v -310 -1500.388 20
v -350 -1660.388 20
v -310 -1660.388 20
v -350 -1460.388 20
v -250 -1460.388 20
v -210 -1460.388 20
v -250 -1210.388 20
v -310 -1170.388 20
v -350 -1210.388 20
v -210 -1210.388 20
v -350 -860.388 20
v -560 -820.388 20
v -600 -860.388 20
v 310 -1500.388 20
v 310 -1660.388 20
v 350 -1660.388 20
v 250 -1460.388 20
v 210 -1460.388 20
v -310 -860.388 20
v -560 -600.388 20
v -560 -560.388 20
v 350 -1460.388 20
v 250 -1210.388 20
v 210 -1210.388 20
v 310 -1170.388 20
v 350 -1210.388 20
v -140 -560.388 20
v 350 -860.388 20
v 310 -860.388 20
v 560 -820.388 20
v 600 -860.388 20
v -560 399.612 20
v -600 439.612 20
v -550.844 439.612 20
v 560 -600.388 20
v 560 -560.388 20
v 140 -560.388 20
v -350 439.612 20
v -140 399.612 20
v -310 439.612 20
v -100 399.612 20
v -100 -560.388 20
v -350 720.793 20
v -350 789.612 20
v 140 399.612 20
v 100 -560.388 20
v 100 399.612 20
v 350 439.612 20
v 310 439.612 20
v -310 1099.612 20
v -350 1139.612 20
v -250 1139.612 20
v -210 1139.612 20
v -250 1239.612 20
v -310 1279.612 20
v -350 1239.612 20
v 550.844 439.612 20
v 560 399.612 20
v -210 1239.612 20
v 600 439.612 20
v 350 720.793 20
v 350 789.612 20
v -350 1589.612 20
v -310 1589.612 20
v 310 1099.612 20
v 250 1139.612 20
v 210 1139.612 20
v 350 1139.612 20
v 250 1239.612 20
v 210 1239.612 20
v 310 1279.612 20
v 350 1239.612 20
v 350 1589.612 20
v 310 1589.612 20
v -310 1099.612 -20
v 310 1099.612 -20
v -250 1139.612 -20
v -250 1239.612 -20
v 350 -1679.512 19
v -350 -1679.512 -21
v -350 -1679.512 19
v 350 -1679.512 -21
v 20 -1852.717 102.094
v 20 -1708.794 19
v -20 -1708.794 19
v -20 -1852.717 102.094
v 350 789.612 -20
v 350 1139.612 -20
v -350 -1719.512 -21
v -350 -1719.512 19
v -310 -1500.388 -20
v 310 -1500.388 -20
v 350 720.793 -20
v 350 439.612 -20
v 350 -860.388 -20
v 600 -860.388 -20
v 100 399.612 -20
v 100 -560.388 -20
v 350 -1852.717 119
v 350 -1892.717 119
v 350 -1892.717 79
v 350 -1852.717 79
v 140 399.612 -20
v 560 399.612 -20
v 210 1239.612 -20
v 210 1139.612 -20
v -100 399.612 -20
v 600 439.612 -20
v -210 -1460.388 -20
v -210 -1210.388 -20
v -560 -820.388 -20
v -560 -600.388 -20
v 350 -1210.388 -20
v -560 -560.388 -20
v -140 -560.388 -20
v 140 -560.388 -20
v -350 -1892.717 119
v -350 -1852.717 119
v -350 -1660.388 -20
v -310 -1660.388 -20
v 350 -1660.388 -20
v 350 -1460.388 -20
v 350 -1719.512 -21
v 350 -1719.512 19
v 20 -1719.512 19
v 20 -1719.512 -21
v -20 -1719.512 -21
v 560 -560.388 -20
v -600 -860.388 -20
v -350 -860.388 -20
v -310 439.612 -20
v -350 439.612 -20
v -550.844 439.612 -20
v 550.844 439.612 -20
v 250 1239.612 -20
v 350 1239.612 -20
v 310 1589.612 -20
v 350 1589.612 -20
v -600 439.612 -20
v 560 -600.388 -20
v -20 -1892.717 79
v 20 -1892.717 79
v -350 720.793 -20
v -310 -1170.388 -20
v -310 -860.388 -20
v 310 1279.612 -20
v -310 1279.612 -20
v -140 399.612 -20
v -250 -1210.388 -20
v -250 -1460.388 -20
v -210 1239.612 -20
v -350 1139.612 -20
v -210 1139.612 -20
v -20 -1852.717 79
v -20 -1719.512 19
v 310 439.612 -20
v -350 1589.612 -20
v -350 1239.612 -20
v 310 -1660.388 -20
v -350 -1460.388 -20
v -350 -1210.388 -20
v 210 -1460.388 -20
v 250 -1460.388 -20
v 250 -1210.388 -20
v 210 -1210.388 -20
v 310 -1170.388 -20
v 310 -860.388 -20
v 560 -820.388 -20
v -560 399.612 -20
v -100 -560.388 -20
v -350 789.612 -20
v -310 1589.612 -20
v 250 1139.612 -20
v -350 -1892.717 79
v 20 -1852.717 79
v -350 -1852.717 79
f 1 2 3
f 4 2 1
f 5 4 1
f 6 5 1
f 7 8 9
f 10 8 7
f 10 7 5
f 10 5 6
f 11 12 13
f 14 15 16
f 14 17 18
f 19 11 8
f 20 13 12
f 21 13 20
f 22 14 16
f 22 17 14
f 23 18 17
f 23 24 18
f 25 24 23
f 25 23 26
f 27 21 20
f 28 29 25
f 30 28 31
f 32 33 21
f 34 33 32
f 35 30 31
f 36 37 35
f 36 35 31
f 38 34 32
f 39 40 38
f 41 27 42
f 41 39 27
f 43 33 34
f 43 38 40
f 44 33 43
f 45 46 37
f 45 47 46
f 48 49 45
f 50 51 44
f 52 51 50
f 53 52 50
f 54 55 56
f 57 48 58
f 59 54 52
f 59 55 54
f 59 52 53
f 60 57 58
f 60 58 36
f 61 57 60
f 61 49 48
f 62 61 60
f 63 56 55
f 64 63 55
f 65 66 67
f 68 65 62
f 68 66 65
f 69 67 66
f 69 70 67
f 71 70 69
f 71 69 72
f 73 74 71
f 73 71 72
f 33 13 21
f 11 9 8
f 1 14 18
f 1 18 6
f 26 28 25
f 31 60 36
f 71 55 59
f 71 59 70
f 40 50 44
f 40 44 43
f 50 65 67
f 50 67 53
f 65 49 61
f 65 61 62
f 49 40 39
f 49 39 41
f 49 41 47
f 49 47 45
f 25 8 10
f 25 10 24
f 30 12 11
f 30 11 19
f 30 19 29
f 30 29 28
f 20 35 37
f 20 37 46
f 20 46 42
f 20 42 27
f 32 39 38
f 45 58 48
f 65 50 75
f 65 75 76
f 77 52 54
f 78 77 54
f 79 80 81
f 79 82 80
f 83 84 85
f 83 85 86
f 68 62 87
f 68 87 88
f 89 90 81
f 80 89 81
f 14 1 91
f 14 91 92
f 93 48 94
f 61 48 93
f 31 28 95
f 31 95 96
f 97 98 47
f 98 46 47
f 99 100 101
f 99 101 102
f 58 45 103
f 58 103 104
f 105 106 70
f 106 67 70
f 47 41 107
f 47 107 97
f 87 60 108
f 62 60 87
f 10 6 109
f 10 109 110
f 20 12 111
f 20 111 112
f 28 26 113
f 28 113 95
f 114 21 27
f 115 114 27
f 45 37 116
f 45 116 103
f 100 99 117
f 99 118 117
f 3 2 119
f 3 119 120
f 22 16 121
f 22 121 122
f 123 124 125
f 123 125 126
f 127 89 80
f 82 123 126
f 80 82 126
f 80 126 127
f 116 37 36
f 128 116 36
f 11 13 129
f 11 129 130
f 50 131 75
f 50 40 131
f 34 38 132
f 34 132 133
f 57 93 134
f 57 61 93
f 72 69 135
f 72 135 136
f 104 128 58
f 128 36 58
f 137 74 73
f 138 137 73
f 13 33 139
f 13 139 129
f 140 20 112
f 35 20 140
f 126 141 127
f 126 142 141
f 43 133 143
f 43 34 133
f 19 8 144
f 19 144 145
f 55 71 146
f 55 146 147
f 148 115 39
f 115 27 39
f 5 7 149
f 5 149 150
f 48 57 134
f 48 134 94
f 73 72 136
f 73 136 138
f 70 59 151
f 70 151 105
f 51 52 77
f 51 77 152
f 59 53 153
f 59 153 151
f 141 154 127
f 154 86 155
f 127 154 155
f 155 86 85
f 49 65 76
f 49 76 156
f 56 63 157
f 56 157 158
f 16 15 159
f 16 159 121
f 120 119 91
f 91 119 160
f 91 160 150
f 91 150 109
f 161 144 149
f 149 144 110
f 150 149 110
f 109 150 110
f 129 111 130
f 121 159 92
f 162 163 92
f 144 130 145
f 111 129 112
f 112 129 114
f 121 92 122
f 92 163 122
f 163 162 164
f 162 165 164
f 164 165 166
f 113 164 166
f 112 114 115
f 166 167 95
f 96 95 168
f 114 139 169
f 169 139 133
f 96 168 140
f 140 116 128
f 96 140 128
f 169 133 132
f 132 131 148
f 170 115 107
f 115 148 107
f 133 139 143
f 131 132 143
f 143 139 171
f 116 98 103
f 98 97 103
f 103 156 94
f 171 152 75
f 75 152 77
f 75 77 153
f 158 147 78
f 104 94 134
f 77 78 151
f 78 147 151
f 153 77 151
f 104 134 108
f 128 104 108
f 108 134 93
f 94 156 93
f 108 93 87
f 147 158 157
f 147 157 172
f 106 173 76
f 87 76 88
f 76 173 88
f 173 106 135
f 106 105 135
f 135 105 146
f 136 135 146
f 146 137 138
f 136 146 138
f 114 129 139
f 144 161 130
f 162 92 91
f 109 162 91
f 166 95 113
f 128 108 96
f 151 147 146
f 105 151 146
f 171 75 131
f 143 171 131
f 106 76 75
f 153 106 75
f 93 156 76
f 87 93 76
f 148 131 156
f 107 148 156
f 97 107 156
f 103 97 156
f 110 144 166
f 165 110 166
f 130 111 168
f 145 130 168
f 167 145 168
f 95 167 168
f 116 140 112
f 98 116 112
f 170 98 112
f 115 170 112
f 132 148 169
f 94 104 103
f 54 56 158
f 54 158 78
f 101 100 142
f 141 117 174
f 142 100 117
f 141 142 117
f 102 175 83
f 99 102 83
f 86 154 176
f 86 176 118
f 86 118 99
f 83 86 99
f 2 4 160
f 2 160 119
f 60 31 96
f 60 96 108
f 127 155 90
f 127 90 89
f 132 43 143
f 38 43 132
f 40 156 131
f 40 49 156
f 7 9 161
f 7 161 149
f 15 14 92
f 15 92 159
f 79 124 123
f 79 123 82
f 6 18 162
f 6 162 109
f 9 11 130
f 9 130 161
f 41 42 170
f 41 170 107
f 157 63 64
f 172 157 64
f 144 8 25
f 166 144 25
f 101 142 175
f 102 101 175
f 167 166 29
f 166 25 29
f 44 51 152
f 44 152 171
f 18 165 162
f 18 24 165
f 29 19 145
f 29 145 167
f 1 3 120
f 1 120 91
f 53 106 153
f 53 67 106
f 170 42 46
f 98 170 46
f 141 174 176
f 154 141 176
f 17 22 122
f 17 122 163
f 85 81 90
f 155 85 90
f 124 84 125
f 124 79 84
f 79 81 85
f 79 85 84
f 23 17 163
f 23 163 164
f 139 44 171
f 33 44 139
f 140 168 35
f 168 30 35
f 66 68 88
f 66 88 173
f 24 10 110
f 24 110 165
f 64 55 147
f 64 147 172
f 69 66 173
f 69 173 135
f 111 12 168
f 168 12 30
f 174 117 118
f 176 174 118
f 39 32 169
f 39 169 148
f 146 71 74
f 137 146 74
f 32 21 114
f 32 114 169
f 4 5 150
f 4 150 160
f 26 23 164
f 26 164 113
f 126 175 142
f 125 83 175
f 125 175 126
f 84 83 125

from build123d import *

# Parameters (mm, degrees)
F0_W     = 420
F0_H     = 960
F0_W_2   = 620
F0_H_2   = 310
F0_W_3   = 1120
F0_H_3   = 220
F0_W_4   = 200
F0_W_5   = 40
F0_H_4   = 100
F0_H_5   = 40
F1_DEPTH = 20
F3_DEPTH = 20
F4_DEPTH = 350


with BuildPart() as f1:
    # F0 (on Top) → F1 (new body, symmetric)
    with BuildSketch(Plane.XY):
        Polygon((0, 439.611647), (-100, 439.611647), (-310, 439.611647), (-310, 789.611647), (-350, 789.611647), (-600, 439.611647), (-600, -560.388353), (-600, -860.388353), (-350, -860.388353), (-350, -1210.388353), (-310, -1210.388353), (-250, -1210.388353), (-250, -1460.388353), (-310, -1460.388353), (-350, -1460.388353), (-350, -1660.388353), (-310, -1660.388353), (-310, -1500.388353), (310, -1500.388353), (310, -1660.388353), (350, -1660.388353), (350, -1460.388353), (310, -1460.388353), (250, -1460.388353), (250, -1210.388353), (310, -1210.388353), (350, -1210.388353), (350, -860.388353), (600, -860.388353), (600, -560.388353), (600, 439.611647), (350, 789.611647), (310, 789.611647), (310, 439.611647), (100, 439.611647), align=None)
        with Locations((-350, -80.388353)):
            Rectangle(F0_W, F0_H, mode=Mode.SUBTRACT)
        Polygon((210, -1460.388353), (0, -1460.388353), (-210, -1460.388353), (-210, -1210.388353), (0, -1210.388353), (210, -1210.388353), align=None, mode=Mode.SUBTRACT)
        with Locations((0, -1015.388353)):
            Rectangle(F0_W_2, F0_H_2, mode=Mode.SUBTRACT)
        with Locations((0, -710.388353)):
            Rectangle(F0_W_3, F0_H_3, mode=Mode.SUBTRACT)
        with Locations((0, -80.388353)):
            Rectangle(F0_W_4, F0_H, mode=Mode.SUBTRACT)
        with Locations((350, -80.388353)):
            Rectangle(F0_W, F0_H, mode=Mode.SUBTRACT)
        Polygon((-350, 720.793045), (-350, 439.611647), (-550.843856, 439.611647), align=None, mode=Mode.SUBTRACT)
        Polygon((550.843856, 439.611647), (350, 439.611647), (350, 720.793045), align=None, mode=Mode.SUBTRACT)
        Polygon((-350, 789.611647), (-310, 789.611647), (-310, 1099.611647), (0, 1099.611647), (310, 1099.611647), (310, 789.611647), (350, 789.611647), (350, 1139.611647), (250, 1139.611647), (210, 1139.611647), (0, 1139.611647), (-210, 1139.611647), (-250, 1139.611647), (-350, 1139.611647), align=None)
        with Locations((-230, 1189.611647)):
            Rectangle(F0_W_5, F0_H_4)
        Polygon((-310, 1239.611647), (-250, 1239.611647), (-210, 1239.611647), (0, 1239.611647), (210, 1239.611647), (250, 1239.611647), (310, 1239.611647), (310, 1279.611647), (0, 1279.611647), (-310, 1279.611647), align=None)
        with Locations((230, 1189.611647)):
            Rectangle(F0_W_5, F0_H_4)
        with Locations((-330, 1259.611647)):
            Rectangle(F0_W_5, F0_H_5)
        with Locations((-330, 1434.611647)):
            Rectangle(F0_W_5, F0_H_2)
        with Locations((330, 1259.611647)):
            Rectangle(F0_W_5, F0_H_5)
        with Locations((330, 1434.611647)):
            Rectangle(F0_W_5, F0_H_2)
    extrude(amount=F1_DEPTH, both=True)


with BuildPart() as f3:
    # F2 (on Right) → F3 (new body, symmetric)
    with BuildSketch(Plane.YZ):
        Polygon((-1719.511804, 18.999981), (-1708.793836, 18.999981), (-1852.716885, 102.093992), (-1852.716885, 78.999981), (-1892.716885, 78.999981), (-1719.511804, -21.000019), align=None)
    extrude(amount=F3_DEPTH, both=True)

    # F2 (on Right) → F4 (join, symmetric)
    with BuildSketch(Plane.YZ):
        Polygon((-1852.716885, 78.999981), (-1852.716885, 102.093992), (-1852.716885, 118.999981), (-1892.716885, 118.999981), (-1892.716885, 78.999981), align=None)
        Polygon((-1679.511804, -21.000019), (-1679.511804, 18.999981), (-1708.793836, 18.999981), (-1719.511804, 18.999981), (-1719.511804, -21.000019), align=None)
    extrude(amount=F4_DEPTH, both=True)


solid = Compound([f1.part, f3.part])
